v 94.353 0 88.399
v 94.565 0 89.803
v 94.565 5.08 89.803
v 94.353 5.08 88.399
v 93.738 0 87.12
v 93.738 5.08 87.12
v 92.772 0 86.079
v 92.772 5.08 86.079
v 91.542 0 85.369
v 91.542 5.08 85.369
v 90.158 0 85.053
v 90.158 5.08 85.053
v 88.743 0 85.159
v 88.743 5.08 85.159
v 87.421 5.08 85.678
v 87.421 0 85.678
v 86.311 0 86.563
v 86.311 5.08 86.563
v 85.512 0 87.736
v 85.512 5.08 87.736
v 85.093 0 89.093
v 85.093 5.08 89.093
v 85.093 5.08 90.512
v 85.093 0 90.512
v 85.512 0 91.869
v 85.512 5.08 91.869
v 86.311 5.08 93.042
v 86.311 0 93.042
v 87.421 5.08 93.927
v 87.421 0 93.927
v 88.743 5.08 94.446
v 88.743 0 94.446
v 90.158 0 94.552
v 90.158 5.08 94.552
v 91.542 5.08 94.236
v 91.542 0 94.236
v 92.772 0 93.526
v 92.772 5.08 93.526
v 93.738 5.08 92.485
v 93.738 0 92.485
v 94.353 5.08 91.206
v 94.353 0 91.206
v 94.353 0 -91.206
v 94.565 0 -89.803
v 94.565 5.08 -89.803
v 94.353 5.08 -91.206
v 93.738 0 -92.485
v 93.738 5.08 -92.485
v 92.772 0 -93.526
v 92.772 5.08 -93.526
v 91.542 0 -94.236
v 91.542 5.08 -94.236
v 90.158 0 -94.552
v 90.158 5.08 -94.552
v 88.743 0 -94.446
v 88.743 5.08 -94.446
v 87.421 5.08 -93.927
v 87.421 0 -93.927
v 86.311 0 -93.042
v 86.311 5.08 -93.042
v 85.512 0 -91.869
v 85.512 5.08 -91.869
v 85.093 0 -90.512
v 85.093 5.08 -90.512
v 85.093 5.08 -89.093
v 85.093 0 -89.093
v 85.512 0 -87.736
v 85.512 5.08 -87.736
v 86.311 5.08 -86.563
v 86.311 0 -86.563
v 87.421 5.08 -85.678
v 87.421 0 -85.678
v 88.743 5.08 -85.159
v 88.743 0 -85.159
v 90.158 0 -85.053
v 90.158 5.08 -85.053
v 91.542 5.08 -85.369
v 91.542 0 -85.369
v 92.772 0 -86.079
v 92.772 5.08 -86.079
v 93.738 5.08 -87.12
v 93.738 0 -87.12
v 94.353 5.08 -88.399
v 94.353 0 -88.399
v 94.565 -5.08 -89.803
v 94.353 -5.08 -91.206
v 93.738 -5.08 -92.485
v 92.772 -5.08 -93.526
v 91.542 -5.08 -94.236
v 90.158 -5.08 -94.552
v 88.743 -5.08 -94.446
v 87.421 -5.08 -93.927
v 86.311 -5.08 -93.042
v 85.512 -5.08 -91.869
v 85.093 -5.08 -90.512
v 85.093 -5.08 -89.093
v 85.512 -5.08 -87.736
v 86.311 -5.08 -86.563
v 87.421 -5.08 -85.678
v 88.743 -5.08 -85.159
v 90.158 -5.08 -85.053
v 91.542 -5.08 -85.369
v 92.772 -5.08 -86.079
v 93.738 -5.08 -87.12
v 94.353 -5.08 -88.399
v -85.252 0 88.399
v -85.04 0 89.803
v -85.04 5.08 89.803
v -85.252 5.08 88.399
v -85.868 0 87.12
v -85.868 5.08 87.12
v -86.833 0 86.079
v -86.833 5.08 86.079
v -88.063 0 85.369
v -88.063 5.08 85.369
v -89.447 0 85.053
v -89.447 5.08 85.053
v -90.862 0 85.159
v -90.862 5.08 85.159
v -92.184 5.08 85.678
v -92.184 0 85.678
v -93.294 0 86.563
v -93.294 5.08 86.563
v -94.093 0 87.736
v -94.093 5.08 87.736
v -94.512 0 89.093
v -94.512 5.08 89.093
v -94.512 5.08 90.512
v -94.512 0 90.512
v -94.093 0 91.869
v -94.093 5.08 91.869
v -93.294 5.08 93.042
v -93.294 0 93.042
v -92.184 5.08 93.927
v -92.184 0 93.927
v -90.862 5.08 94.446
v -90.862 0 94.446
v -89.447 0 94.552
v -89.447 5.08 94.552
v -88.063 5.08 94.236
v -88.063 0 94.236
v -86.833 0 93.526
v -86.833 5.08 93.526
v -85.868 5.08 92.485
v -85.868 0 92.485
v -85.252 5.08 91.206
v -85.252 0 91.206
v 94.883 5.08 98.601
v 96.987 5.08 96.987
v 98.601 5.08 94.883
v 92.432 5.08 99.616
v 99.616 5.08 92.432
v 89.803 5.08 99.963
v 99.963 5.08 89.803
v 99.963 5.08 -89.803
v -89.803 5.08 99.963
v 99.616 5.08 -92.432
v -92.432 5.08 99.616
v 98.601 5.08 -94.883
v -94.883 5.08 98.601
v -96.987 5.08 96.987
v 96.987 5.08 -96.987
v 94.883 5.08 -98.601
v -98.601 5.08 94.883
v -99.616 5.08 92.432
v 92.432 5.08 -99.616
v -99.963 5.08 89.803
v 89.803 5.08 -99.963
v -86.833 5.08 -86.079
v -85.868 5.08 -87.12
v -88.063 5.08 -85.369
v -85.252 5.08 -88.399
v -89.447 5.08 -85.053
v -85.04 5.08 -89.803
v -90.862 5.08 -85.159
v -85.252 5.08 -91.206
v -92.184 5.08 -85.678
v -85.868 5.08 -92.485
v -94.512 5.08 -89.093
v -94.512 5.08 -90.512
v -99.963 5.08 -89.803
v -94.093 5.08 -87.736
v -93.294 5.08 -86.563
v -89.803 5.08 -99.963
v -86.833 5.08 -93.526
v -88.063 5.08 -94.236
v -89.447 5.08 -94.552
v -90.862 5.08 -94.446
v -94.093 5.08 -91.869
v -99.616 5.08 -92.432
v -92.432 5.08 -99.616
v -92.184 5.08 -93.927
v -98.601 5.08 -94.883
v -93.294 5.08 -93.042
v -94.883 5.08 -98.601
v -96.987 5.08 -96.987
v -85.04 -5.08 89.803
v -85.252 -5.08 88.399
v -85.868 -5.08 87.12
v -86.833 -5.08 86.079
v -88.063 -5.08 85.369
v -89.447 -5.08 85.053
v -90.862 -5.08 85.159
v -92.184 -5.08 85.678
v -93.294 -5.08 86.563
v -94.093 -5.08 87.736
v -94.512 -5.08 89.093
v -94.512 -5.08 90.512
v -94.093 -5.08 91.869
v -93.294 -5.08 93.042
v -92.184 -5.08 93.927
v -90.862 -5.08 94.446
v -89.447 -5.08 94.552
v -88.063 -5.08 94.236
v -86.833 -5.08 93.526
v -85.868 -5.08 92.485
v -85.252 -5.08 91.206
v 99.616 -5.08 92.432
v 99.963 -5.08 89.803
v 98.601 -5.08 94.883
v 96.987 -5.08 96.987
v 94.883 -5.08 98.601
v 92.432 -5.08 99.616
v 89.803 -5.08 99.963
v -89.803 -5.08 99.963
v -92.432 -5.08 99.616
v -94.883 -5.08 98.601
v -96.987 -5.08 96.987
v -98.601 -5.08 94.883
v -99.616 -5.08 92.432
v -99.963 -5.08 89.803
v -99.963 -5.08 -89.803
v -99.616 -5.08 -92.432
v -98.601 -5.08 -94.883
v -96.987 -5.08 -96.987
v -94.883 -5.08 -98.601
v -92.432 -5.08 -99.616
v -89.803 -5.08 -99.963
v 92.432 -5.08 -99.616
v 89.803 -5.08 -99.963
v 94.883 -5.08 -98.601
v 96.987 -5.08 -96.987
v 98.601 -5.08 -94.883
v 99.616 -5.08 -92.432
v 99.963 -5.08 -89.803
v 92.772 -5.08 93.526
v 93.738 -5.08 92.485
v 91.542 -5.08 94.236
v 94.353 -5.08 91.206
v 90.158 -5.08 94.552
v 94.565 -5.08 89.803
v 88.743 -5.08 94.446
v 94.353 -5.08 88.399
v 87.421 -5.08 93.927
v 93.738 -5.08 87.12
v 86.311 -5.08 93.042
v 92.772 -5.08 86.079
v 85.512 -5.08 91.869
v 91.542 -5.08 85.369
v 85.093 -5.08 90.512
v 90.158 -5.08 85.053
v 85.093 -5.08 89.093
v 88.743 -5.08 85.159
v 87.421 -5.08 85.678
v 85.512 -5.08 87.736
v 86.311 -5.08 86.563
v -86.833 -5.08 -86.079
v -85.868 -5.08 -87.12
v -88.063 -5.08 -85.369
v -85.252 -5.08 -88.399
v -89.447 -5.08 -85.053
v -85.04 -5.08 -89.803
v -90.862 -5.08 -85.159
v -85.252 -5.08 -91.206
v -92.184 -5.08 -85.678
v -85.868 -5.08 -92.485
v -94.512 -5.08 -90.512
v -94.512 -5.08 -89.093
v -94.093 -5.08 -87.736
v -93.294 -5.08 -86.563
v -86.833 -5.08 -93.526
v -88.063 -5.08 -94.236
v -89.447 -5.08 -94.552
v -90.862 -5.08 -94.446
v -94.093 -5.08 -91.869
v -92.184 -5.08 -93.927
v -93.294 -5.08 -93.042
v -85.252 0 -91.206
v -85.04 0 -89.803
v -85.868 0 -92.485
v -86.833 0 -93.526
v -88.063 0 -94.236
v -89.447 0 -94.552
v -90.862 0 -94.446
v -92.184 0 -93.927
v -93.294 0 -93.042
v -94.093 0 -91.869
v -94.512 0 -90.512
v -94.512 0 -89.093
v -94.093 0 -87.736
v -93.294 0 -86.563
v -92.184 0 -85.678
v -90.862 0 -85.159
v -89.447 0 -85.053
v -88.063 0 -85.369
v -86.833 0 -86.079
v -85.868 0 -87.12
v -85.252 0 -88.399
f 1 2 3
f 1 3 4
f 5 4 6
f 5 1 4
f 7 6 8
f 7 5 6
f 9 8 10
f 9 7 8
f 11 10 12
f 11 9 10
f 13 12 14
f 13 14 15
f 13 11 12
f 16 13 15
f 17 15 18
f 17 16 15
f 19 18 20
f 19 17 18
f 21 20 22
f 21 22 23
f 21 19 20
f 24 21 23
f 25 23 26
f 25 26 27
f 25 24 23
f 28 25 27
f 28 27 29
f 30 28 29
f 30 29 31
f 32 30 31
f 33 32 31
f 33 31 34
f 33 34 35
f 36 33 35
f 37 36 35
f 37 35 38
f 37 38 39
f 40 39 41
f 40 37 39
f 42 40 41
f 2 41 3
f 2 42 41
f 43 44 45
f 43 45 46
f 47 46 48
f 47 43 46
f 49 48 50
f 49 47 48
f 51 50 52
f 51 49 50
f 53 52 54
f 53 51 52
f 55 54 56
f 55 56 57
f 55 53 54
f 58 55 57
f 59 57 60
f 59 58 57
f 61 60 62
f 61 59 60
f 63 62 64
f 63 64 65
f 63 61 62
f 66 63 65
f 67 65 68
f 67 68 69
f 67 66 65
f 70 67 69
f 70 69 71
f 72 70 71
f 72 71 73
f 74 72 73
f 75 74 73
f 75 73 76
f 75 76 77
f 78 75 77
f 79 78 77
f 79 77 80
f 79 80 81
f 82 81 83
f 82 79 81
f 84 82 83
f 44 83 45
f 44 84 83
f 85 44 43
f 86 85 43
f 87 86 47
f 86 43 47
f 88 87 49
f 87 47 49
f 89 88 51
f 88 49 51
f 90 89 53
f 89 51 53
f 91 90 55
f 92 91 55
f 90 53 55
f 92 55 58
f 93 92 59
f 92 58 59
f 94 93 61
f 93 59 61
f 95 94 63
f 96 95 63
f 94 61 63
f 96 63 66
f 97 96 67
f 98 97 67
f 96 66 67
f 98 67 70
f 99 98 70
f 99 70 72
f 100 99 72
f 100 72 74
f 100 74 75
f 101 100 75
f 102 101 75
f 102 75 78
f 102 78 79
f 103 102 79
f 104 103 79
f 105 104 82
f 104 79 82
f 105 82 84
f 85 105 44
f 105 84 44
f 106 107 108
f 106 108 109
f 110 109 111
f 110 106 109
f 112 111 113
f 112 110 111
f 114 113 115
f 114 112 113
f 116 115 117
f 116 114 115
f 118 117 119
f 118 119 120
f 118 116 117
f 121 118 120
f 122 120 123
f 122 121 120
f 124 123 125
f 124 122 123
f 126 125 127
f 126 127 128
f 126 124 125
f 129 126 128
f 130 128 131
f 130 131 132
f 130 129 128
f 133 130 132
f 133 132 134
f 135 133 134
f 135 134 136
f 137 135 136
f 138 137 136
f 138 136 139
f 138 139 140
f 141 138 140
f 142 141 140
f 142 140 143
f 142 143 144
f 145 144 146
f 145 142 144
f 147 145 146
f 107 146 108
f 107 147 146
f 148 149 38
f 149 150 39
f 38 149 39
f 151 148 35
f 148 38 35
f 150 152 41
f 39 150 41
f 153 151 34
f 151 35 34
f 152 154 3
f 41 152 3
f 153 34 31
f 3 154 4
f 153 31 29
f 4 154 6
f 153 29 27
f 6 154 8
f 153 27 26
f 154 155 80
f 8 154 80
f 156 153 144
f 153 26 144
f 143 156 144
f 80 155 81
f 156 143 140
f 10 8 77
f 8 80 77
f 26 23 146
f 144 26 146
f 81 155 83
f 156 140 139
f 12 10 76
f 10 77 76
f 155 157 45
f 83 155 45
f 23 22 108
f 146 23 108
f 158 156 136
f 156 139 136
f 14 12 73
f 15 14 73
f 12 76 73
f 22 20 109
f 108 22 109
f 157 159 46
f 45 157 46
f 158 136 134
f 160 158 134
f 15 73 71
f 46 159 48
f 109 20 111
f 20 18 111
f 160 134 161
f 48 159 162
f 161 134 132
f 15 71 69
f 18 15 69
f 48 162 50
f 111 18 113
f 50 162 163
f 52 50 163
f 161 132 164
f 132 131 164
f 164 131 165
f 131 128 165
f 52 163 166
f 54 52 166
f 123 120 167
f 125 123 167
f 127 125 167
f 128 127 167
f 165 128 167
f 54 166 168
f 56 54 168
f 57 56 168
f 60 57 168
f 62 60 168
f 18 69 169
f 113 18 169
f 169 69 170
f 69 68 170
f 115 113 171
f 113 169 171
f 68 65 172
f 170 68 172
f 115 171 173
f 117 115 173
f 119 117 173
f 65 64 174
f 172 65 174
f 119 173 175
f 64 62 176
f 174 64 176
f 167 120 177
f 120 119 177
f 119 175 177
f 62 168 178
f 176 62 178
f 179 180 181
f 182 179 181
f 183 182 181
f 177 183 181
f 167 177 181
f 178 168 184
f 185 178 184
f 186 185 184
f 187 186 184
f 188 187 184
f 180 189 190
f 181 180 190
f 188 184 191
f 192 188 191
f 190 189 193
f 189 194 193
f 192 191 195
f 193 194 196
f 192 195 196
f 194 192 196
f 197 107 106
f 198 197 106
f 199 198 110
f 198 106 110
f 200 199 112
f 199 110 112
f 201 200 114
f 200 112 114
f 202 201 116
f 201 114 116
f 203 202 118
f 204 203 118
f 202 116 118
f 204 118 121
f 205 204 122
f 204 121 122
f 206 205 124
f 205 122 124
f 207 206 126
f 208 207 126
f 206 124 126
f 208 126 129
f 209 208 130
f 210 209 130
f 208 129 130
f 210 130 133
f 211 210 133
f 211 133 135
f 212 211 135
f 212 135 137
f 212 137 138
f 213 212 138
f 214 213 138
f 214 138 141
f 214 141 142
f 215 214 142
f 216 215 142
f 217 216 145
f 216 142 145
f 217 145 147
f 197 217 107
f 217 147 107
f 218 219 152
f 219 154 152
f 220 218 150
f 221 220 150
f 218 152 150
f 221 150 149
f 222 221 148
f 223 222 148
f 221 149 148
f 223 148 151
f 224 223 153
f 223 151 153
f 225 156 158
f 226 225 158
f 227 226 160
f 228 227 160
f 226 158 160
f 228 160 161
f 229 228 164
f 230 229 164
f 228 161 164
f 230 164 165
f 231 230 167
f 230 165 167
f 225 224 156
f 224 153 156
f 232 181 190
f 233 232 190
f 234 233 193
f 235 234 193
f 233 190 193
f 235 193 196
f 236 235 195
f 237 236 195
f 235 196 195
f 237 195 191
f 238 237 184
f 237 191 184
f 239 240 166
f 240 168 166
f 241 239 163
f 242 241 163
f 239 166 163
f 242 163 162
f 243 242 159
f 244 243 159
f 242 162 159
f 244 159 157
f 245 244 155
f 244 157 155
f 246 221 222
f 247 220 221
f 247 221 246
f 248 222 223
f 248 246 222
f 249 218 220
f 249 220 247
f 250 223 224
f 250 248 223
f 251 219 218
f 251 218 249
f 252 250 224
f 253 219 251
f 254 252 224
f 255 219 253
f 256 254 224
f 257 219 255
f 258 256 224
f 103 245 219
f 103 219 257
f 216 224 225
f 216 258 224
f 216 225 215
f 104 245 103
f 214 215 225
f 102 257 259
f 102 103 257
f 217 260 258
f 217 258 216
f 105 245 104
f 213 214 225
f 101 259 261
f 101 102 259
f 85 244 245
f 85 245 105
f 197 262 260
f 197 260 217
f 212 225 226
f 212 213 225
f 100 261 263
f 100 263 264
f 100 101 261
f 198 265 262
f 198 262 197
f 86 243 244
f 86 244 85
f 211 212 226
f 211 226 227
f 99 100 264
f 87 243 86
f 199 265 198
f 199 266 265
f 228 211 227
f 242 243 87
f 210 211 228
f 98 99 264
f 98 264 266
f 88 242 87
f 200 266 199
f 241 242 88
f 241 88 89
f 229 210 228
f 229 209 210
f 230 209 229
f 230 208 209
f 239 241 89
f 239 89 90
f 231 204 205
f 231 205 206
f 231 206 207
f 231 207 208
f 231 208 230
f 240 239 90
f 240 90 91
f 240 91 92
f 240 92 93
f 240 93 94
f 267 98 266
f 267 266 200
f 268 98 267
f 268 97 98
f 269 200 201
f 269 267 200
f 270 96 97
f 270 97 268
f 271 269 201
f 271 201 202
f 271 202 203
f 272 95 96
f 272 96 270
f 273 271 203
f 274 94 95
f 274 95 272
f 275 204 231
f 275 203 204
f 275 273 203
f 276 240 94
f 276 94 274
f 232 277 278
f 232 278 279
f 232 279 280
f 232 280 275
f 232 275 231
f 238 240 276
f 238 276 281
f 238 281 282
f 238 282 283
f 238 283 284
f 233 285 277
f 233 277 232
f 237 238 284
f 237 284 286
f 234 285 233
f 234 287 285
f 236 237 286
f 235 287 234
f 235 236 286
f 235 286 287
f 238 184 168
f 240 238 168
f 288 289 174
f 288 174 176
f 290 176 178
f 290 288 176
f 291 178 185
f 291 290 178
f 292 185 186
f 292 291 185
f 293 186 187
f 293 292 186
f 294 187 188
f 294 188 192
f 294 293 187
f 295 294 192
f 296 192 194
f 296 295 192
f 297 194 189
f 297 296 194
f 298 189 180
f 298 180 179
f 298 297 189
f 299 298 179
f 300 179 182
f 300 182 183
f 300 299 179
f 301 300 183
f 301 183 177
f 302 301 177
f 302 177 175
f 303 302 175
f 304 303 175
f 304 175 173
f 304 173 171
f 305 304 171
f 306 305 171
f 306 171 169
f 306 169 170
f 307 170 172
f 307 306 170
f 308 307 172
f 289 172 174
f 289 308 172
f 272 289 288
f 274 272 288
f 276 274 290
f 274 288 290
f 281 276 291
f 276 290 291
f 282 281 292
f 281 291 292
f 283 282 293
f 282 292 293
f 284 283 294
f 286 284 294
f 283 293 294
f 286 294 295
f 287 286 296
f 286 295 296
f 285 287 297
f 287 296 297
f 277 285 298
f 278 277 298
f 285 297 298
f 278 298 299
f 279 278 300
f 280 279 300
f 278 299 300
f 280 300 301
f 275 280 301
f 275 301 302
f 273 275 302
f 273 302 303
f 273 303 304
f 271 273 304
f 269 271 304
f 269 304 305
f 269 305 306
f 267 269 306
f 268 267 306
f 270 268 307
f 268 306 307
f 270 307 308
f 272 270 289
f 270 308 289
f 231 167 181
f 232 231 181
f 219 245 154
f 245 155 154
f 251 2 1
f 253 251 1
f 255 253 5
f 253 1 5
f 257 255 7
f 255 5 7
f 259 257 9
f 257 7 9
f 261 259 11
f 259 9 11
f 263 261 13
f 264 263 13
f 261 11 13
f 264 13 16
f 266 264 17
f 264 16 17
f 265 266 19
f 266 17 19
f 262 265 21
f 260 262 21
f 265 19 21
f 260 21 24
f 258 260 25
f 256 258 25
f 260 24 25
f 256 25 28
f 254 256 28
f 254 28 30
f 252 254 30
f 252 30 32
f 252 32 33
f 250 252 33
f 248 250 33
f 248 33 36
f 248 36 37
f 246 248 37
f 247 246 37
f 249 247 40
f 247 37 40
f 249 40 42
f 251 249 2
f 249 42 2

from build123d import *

# Parameters (mm, degrees)
BOSS_EXTRUDE2_DEPTH      = 5.08
BOSS_EXTRUDE2_DEPTH_BACK = 5.08
SKETCH1_R                = 4.7625


with BuildPart() as part:
    # Sketch1 → Boss-Extrude2 (new, two sides: drawn at the far end of the back side and taken through both)
    with BuildSketch(Plane(origin=(0, 0, 0), x_dir=(1, 0, 0), z_dir=(0, 1, 0)).offset(-BOSS_EXTRUDE2_DEPTH_BACK)):
        with BuildLine():
            Line((-89.802561211, 99.962561211), (89.802561211, 99.962561211))
            ThreePointArc((89.802561211, 99.962561211), (96.986766108, 96.986766108), (99.962561211, 89.802561211))
            Line((99.962561211, 89.802561211), (99.962561211, -89.802561211))
            ThreePointArc((99.962561211, -89.802561211), (96.986766108, -96.986766108), (89.802561211, -99.962561211))
            Line((89.802561211, -99.962561211), (-89.802561211, -99.962561211))
            ThreePointArc((-89.802561211, -99.962561211), (-96.986766108, -96.986766108), (-99.962561211, -89.802561211))
            Line((-99.962561211, -89.802561211), (-99.962561211, 89.802561211))
            ThreePointArc((-99.962561211, 89.802561211), (-96.986766108, 96.986766108), (-89.802561211, 99.962561211))
        make_face()
        with Locations((89.802561211, 89.802561211)):
            Circle(SKETCH1_R, mode=Mode.SUBTRACT)
        with Locations((89.802561211, -89.802561211)):
            Circle(SKETCH1_R, mode=Mode.SUBTRACT)
        with Locations((-89.802561211, -89.802561211)):
            Circle(SKETCH1_R, mode=Mode.SUBTRACT)
        with Locations((-89.802561211, 89.802561211)):
            Circle(SKETCH1_R, mode=Mode.SUBTRACT)
    extrude(amount=BOSS_EXTRUDE2_DEPTH + BOSS_EXTRUDE2_DEPTH_BACK)


solid = part.part
